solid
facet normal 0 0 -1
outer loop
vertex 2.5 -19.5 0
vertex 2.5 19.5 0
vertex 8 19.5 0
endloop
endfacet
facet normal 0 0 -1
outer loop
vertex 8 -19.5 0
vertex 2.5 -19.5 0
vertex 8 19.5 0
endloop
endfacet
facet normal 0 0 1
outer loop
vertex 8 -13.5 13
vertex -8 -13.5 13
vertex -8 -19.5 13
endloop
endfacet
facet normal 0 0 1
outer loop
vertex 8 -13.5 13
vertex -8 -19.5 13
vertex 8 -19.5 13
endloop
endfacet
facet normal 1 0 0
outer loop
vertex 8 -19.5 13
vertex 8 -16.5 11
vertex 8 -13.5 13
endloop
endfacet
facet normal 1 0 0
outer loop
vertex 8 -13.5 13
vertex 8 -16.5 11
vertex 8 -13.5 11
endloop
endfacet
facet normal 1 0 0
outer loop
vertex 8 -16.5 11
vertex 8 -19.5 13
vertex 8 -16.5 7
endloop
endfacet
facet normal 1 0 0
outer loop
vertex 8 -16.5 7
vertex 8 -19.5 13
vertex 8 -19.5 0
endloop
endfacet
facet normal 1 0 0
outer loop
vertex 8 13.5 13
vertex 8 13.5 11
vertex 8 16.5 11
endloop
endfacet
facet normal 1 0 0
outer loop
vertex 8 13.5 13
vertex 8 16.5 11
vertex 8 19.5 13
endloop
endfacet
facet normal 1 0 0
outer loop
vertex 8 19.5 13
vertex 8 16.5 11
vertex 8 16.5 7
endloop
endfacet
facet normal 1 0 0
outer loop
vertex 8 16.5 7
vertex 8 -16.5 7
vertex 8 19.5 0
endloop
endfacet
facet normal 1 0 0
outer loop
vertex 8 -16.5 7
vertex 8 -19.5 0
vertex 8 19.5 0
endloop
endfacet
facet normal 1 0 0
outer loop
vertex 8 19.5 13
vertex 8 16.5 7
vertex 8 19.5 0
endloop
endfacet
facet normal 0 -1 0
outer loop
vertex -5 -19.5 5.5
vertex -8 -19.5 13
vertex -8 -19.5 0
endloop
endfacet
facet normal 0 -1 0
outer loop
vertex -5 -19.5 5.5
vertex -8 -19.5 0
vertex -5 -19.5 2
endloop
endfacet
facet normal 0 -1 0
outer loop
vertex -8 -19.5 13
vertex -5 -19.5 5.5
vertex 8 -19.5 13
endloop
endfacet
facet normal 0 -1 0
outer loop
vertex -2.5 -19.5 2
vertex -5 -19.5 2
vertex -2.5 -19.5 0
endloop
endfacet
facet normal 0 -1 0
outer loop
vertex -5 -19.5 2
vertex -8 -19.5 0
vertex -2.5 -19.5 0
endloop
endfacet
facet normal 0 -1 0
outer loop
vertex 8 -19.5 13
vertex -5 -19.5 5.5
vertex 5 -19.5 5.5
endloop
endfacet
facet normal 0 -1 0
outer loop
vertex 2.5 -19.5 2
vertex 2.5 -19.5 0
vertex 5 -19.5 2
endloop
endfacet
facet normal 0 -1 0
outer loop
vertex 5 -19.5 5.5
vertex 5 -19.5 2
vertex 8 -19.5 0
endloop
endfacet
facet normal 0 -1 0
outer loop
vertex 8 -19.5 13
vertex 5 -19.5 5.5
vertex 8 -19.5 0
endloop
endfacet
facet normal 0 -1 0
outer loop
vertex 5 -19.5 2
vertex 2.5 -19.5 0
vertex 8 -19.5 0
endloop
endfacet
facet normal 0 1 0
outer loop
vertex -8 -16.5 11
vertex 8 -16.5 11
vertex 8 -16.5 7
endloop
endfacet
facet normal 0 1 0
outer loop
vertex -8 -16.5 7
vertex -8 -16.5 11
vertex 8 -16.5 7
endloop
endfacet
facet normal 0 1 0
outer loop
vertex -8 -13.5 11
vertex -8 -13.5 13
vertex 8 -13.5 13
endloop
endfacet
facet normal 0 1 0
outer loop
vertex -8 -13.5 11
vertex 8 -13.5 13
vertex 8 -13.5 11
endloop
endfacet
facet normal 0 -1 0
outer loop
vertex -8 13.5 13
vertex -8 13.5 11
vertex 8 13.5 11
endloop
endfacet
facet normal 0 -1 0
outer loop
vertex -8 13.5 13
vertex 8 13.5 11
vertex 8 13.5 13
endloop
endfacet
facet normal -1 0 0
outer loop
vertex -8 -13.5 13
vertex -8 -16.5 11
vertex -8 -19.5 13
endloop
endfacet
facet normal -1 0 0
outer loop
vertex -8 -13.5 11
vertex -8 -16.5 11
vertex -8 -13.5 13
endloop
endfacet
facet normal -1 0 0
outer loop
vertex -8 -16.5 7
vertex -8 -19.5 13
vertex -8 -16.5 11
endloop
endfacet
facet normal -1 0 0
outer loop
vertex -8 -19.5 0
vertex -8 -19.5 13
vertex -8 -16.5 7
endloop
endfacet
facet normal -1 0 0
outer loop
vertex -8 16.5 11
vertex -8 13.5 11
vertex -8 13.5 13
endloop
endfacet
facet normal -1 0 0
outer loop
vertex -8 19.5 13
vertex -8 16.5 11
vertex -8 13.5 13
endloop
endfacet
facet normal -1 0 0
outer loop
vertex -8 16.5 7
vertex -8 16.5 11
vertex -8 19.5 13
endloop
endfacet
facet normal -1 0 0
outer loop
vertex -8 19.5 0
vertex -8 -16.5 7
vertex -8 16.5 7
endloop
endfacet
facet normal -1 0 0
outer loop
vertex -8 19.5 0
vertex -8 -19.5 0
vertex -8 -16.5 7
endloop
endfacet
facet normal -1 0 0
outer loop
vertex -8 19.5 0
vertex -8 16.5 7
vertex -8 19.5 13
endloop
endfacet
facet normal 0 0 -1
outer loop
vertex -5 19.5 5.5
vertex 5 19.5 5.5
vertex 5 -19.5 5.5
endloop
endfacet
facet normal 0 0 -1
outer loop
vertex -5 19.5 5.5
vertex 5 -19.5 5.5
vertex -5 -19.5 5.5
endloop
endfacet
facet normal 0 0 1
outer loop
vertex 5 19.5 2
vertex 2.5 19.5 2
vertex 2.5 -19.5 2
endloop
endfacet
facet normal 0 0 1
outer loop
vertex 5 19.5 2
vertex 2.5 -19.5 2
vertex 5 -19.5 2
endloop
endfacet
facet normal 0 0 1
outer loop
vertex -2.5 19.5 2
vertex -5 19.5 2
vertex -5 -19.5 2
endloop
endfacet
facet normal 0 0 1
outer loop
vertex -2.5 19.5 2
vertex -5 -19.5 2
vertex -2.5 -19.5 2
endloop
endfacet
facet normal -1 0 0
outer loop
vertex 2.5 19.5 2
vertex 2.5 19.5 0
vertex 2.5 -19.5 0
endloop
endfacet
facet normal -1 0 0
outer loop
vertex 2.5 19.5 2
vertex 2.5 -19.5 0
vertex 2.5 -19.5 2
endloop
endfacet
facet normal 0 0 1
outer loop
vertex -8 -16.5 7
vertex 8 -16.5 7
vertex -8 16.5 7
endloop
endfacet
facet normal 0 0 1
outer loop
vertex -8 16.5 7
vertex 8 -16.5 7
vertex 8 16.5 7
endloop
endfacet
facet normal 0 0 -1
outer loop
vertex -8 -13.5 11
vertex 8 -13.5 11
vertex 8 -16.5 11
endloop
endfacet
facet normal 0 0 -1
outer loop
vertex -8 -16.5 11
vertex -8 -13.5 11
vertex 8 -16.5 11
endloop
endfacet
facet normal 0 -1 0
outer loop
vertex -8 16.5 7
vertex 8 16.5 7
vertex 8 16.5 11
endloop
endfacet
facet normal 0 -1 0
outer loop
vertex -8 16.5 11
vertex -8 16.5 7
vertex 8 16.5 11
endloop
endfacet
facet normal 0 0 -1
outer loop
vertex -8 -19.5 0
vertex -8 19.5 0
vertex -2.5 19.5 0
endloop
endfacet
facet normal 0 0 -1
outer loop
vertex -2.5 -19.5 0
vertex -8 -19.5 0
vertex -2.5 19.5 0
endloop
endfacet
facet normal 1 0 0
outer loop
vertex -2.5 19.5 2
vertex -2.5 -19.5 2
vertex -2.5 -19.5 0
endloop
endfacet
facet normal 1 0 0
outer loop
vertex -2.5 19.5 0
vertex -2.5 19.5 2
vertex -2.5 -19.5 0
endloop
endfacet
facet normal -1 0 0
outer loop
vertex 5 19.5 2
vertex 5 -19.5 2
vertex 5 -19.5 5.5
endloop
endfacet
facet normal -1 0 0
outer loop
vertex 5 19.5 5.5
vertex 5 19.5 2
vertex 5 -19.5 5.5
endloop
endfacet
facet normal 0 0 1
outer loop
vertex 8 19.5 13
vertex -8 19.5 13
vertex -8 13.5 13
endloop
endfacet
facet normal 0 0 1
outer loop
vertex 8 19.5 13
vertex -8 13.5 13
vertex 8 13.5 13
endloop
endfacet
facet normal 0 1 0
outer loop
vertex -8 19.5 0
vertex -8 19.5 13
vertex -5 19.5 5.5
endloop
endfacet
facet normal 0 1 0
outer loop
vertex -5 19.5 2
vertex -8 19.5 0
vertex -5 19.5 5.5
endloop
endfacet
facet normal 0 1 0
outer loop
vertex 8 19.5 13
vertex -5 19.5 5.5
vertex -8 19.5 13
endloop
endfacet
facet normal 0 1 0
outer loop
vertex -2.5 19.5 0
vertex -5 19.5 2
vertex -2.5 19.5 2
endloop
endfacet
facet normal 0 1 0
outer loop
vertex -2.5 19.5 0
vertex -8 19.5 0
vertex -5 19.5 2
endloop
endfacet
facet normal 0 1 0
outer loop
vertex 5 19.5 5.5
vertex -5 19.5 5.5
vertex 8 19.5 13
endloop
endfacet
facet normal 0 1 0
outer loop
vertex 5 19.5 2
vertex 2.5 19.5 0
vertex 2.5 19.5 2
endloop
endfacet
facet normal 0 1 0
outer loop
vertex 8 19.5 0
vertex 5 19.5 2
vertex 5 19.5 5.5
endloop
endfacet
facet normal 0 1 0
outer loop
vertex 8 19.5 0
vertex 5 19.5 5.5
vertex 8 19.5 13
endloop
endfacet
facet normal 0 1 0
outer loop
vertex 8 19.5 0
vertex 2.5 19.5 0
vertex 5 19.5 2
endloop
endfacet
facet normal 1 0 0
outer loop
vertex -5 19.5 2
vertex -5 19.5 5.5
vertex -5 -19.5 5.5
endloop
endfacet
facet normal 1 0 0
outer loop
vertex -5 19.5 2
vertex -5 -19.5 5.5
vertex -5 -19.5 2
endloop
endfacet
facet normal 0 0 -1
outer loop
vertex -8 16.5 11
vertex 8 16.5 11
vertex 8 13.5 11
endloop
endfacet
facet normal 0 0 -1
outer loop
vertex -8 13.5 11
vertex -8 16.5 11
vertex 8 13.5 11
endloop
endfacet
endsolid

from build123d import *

# Parameters (mm, degrees)
SKETCH_W        = 16
SKETCH_H        = 39
PAD_DEPTH       = 13
POCKET_DEPTH    = 39.001
POCKET001_DEPTH = 16.001


with BuildPart() as part:
    # Sketch → Pad (new body)
    with BuildSketch(Plane.XY):
        Rectangle(SKETCH_W, SKETCH_H)
    extrude(amount=PAD_DEPTH)

    # Sketch001 (on Face1 of Pad) → Pocket (cut, through all)
    with BuildSketch(Plane(origin=(0, 19.5, 0), x_dir=(-1, 0, 0), z_dir=(0, 1, 0))):
        Polygon((-5, 5.5), (5, 5.5), (5, 2), (2.5, 2), (2.5, 0), (-2.5, 0), (-2.5, 2), (-5, 2), align=None)
    extrude(amount=-POCKET_DEPTH, mode=Mode.SUBTRACT)

    # Sketch002 (on Face11 of Pocket) → Pocket001 (cut, through all)
    with BuildSketch(Plane.YZ.offset(8)):
        Polygon((-13.5, 13), (-13.5, 11), (-16.5, 11), (-16.5, 7), (16.5, 7), (16.5, 11), (13.5, 11), (13.5, 13), align=None)
    extrude(amount=-POCKET001_DEPTH, mode=Mode.SUBTRACT)


solid = part.part
